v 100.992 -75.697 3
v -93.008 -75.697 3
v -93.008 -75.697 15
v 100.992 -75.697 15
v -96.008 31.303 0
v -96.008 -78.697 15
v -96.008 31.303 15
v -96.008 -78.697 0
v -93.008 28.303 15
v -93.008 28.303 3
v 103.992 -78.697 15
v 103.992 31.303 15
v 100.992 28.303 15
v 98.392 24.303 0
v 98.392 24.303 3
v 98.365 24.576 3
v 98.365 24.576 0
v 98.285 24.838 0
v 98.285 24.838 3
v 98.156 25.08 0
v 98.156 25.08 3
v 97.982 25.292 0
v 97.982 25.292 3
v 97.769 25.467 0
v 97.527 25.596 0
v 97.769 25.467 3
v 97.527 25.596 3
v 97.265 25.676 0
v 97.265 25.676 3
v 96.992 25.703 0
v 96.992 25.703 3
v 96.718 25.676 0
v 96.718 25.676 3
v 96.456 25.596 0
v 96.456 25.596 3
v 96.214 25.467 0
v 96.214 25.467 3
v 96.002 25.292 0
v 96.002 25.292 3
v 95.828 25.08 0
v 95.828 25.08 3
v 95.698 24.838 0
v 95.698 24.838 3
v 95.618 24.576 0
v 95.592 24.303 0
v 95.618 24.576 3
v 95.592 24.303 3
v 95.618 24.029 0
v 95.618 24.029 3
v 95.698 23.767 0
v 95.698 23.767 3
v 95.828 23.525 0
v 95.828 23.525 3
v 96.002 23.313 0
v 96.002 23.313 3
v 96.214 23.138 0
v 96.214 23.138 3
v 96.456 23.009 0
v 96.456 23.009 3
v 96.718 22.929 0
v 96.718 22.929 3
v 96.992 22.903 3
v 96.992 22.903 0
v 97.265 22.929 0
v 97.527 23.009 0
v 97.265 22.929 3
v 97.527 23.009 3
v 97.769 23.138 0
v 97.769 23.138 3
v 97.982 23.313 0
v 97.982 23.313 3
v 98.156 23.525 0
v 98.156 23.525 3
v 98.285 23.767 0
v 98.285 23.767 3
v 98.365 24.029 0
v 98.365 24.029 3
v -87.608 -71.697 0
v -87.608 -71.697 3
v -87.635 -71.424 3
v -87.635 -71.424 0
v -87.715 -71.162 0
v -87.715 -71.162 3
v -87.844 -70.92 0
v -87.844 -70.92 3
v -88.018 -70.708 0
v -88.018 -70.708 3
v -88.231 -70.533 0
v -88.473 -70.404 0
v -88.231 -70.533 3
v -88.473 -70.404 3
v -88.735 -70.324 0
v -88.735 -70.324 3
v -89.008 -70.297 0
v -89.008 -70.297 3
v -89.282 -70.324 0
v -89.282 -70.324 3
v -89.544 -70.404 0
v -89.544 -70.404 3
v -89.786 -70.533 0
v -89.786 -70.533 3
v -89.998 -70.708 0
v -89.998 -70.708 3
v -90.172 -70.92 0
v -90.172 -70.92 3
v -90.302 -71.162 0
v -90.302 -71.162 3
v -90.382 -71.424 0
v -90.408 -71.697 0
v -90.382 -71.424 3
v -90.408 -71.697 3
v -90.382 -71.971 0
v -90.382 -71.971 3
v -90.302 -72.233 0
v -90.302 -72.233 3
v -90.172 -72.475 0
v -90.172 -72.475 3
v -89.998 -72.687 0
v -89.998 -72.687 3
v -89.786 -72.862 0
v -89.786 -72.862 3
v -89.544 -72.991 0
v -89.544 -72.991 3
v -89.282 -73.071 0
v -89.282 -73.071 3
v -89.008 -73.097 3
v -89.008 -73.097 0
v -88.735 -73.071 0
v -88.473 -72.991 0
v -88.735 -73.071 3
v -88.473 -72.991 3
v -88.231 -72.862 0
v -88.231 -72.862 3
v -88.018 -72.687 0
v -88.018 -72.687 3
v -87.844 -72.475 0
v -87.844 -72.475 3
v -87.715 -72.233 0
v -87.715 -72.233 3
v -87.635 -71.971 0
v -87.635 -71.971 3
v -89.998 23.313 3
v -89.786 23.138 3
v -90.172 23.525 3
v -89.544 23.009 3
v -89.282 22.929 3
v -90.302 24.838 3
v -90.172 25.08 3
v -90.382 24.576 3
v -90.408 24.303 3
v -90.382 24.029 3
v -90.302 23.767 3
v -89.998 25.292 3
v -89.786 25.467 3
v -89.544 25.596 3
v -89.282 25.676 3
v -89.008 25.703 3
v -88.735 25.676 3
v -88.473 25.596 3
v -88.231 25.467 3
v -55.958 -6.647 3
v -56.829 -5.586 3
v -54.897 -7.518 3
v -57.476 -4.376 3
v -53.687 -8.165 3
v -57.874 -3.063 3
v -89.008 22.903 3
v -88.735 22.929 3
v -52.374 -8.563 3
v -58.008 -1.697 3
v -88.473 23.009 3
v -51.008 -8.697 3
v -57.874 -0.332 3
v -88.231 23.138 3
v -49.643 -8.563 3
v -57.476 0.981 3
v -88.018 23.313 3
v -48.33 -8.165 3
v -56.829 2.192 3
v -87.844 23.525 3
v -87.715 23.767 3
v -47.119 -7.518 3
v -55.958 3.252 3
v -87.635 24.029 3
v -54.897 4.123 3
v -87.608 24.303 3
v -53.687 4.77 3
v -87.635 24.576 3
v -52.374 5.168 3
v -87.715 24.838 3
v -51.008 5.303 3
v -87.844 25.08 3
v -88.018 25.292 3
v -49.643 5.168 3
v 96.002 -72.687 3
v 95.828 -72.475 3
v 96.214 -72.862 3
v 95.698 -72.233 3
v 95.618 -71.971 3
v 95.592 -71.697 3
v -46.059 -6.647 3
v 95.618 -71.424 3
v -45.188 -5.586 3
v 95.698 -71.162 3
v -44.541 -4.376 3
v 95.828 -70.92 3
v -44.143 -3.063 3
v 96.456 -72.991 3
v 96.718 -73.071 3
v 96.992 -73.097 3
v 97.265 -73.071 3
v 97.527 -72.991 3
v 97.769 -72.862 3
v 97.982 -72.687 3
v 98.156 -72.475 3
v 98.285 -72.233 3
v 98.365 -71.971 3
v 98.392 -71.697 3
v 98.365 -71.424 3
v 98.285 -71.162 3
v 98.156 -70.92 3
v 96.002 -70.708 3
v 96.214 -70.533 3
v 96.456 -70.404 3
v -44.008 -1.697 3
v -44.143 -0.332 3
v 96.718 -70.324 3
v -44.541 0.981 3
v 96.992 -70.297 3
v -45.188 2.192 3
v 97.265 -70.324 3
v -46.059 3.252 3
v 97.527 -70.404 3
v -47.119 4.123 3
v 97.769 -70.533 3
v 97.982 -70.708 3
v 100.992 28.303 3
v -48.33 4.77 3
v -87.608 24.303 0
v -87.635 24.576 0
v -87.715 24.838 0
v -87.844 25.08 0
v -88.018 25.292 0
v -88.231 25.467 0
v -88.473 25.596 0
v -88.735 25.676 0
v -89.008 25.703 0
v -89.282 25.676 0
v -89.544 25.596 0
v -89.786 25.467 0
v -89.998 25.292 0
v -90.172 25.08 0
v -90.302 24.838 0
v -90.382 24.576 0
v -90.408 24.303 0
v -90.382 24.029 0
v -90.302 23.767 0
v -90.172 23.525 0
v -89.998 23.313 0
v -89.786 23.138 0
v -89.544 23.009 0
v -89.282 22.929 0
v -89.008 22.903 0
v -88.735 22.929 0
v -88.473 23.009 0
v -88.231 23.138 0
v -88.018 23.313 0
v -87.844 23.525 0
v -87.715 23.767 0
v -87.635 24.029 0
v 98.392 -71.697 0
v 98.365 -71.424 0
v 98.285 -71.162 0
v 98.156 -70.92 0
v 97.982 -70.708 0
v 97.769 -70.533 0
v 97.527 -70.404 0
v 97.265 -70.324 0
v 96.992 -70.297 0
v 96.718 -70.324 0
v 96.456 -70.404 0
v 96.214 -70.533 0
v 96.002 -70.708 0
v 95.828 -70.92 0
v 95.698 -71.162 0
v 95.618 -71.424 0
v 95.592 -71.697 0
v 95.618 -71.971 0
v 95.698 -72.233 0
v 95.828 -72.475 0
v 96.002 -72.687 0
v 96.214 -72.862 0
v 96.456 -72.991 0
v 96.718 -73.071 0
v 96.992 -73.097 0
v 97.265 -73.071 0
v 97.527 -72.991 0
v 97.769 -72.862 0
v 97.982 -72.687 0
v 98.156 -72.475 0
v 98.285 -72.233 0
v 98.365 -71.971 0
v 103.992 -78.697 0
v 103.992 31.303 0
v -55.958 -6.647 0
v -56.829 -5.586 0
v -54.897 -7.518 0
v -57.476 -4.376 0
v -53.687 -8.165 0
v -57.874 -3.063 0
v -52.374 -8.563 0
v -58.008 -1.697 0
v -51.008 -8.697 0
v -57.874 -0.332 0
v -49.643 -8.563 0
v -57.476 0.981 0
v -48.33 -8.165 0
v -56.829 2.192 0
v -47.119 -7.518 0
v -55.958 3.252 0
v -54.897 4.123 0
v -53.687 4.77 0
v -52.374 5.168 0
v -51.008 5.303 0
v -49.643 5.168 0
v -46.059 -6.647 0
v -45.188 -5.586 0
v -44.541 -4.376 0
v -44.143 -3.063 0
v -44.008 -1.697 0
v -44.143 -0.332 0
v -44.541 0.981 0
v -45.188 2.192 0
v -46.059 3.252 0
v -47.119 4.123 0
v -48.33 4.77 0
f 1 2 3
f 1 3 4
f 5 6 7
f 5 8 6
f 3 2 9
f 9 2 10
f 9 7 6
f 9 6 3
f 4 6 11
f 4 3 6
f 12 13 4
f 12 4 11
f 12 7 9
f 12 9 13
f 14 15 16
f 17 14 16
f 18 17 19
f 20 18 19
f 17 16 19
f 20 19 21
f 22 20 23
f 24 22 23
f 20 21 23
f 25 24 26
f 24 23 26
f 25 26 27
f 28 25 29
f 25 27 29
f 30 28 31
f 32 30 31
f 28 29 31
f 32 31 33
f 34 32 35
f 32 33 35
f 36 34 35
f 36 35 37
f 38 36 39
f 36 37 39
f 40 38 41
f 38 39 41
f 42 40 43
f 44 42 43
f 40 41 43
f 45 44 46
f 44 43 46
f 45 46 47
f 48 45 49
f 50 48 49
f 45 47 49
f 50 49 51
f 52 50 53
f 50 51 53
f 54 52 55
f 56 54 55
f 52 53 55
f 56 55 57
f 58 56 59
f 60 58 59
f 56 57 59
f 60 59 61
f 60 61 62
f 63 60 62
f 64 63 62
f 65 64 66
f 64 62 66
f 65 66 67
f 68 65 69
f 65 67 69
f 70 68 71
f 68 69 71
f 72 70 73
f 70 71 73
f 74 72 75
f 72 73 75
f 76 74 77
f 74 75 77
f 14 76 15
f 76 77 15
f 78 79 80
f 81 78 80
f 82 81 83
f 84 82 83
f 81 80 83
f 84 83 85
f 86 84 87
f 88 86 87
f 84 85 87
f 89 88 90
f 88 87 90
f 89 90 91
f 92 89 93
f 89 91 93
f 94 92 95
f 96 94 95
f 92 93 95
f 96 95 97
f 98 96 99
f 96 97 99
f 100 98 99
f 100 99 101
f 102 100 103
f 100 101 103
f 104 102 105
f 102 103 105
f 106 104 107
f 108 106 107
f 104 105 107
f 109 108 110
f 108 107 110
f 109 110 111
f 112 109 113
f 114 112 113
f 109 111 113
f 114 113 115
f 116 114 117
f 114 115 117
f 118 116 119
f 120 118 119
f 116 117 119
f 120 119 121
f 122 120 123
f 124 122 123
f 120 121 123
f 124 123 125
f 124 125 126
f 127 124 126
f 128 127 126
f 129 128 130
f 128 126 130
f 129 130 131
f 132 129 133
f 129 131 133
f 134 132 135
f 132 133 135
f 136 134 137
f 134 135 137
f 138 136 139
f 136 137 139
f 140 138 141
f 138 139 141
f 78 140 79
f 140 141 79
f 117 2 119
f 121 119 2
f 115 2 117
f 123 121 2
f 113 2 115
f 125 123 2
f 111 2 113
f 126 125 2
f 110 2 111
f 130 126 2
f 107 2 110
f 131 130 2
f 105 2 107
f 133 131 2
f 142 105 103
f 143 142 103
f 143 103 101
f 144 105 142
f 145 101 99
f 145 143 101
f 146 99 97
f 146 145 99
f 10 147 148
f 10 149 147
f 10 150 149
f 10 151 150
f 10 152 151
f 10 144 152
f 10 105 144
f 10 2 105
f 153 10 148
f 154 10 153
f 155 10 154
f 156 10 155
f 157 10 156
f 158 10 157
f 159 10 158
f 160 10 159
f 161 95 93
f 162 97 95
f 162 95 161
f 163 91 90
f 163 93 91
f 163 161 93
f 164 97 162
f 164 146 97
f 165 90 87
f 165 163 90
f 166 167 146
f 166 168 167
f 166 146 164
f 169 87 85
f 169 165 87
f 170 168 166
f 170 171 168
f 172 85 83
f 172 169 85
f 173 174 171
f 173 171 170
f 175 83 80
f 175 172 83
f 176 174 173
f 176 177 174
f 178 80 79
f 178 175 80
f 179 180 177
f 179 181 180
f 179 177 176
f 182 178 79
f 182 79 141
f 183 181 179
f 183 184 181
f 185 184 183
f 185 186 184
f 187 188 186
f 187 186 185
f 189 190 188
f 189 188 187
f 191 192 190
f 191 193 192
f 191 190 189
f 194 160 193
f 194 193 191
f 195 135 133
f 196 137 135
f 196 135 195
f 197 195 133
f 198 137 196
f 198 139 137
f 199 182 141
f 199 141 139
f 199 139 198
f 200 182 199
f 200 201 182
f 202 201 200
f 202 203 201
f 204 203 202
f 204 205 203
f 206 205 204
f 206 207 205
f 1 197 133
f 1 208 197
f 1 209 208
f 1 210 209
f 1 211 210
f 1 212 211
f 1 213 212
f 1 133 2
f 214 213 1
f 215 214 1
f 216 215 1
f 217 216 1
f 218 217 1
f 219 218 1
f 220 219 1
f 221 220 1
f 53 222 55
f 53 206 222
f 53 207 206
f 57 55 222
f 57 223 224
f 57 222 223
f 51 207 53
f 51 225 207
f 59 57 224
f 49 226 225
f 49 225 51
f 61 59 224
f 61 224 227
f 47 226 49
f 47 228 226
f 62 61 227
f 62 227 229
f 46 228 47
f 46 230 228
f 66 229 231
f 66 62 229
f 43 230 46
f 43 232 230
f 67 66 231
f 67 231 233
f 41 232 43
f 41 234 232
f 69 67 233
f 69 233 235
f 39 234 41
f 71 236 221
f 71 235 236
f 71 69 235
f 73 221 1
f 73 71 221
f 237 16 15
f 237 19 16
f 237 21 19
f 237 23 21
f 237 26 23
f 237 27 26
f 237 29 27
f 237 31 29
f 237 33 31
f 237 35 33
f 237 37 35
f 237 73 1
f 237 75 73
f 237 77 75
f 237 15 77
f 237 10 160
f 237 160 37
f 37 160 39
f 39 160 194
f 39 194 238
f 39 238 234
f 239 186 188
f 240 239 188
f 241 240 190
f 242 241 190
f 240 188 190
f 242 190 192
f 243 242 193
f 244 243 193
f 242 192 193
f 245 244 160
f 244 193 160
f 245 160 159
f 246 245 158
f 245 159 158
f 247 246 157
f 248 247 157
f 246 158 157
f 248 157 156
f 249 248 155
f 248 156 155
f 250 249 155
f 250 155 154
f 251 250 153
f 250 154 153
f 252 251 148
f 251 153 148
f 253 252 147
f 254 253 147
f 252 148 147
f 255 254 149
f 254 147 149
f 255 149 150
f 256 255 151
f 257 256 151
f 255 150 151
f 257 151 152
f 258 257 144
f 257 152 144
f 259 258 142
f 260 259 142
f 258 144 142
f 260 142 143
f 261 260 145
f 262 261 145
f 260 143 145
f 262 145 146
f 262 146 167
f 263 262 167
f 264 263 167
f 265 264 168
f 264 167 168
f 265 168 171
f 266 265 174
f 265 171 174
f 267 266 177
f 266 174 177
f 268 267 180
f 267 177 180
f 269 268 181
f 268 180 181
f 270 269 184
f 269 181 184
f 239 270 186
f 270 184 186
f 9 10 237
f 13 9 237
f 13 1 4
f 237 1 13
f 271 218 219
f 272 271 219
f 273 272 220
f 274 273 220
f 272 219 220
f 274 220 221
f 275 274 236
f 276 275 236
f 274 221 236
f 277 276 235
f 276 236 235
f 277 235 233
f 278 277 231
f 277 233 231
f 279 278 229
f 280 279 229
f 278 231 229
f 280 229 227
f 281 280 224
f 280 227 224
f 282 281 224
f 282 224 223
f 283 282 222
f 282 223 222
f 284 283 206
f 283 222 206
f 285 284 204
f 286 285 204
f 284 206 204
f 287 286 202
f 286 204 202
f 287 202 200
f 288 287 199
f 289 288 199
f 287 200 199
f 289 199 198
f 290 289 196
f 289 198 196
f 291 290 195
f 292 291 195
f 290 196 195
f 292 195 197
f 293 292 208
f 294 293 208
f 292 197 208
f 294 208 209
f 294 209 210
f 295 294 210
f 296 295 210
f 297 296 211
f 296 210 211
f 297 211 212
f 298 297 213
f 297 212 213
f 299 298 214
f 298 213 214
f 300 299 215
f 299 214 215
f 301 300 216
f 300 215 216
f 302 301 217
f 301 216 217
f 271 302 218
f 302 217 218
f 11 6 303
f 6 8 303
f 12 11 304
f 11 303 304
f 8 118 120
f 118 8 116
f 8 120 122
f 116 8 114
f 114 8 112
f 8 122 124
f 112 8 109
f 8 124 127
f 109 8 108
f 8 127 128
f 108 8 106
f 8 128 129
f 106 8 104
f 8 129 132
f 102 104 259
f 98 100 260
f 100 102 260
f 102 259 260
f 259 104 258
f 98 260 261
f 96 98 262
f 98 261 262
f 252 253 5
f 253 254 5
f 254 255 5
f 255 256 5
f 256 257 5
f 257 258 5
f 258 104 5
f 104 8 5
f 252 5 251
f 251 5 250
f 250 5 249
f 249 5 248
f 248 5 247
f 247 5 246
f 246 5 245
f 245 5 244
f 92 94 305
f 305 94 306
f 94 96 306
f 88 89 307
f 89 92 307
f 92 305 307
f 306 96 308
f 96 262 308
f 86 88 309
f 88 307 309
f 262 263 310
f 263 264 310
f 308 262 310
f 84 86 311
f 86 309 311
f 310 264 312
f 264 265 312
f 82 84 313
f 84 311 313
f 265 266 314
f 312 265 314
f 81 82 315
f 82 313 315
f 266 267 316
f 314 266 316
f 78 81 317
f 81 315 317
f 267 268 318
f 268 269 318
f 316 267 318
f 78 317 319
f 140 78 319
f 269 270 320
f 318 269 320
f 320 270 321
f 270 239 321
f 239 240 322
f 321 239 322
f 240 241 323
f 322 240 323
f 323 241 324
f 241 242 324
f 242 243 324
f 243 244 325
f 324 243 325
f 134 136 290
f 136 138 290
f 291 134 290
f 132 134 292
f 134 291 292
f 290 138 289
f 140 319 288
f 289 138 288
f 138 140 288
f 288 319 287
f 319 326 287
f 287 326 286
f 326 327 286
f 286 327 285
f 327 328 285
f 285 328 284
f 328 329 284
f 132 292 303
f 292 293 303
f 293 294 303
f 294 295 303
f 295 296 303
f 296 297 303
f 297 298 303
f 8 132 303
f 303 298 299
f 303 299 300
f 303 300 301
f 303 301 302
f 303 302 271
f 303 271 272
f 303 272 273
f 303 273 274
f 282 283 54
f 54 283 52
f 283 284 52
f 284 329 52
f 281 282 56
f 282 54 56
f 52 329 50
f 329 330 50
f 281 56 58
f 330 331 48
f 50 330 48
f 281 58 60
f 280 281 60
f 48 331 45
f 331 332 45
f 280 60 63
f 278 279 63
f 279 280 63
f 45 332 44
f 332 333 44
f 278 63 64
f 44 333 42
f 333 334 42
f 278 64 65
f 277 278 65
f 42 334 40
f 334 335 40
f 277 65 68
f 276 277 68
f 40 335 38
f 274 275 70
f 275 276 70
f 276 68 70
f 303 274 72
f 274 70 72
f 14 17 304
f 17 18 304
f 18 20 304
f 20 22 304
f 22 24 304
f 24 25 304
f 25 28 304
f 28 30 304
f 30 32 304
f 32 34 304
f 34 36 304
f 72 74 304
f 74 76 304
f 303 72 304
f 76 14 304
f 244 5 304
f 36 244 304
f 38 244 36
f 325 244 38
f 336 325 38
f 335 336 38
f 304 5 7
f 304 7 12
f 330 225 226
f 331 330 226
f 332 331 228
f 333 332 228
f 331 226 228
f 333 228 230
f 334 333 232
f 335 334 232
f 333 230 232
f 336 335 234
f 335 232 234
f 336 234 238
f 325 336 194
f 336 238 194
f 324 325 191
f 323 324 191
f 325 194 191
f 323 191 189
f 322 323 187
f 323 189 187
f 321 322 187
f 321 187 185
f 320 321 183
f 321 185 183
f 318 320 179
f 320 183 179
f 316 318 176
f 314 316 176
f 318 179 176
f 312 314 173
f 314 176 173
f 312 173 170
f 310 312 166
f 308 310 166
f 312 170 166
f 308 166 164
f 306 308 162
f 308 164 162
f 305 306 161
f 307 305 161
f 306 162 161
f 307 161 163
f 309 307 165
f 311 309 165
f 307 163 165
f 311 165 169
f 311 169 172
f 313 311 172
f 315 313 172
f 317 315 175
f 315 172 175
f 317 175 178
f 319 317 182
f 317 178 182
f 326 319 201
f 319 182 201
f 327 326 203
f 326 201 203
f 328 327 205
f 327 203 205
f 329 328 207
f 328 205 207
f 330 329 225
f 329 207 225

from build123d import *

# Parameters (mm, degrees)
SKETCH1_W           = 200
SKETCH1_H           = 110
BOSS_EXTRUDE1_DEPTH = 3
SKETCH2_W           = 200
SKETCH2_H           = 110
SKETCH2_W_2         = 194
SKETCH2_H_2         = 104
BOSS_EXTRUDE2_DEPTH = 12
SKETCH3_R           = 1.4
CUT_EXTRUDE2_DEPTH  = 3
SKETCH5_R           = 7
CUT_EXTRUDE3_DEPTH  = 3


with BuildPart() as part:
    # Sketch1 → Boss-Extrude1 (new body)
    with BuildSketch(Plane.XY):
        with Locations((3.991596639, -23.697478992)):
            Rectangle(SKETCH1_W, SKETCH1_H)
    extrude(amount=BOSS_EXTRUDE1_DEPTH)

    # Sketch2 → Boss-Extrude2 (add)
    with BuildSketch(Plane.XY.offset(3)):
        with Locations((3.991596639, -23.697478992)):
            Rectangle(SKETCH2_W, SKETCH2_H)
        with Locations((3.991596639, -23.697478992)):
            Rectangle(SKETCH2_W_2, SKETCH2_H_2, mode=Mode.SUBTRACT)
    extrude(amount=BOSS_EXTRUDE2_DEPTH)

    # Sketch3 → Cut-Extrude2 (cut)
    with BuildSketch(Plane.XY.offset(3)):
        with Locations((-89.008403361, 24.302521008)):
            Circle(SKETCH3_R)
        with Locations((-89.008403361, -71.697478992)):
            Circle(SKETCH3_R)
        with Locations((96.991596639, 24.302521008)):
            Circle(SKETCH3_R)
        with Locations((96.991596639, -71.697478992)):
            Circle(SKETCH3_R)
    extrude(amount=-CUT_EXTRUDE2_DEPTH, mode=Mode.SUBTRACT)

    # Sketch5 → Cut-Extrude3 (cut)
    with BuildSketch(Plane.XY.offset(3)):
        with Locations((-51.008403361, -1.697478992)):
            Circle(SKETCH5_R)
    extrude(amount=-CUT_EXTRUDE3_DEPTH, mode=Mode.SUBTRACT)


solid = part.part
